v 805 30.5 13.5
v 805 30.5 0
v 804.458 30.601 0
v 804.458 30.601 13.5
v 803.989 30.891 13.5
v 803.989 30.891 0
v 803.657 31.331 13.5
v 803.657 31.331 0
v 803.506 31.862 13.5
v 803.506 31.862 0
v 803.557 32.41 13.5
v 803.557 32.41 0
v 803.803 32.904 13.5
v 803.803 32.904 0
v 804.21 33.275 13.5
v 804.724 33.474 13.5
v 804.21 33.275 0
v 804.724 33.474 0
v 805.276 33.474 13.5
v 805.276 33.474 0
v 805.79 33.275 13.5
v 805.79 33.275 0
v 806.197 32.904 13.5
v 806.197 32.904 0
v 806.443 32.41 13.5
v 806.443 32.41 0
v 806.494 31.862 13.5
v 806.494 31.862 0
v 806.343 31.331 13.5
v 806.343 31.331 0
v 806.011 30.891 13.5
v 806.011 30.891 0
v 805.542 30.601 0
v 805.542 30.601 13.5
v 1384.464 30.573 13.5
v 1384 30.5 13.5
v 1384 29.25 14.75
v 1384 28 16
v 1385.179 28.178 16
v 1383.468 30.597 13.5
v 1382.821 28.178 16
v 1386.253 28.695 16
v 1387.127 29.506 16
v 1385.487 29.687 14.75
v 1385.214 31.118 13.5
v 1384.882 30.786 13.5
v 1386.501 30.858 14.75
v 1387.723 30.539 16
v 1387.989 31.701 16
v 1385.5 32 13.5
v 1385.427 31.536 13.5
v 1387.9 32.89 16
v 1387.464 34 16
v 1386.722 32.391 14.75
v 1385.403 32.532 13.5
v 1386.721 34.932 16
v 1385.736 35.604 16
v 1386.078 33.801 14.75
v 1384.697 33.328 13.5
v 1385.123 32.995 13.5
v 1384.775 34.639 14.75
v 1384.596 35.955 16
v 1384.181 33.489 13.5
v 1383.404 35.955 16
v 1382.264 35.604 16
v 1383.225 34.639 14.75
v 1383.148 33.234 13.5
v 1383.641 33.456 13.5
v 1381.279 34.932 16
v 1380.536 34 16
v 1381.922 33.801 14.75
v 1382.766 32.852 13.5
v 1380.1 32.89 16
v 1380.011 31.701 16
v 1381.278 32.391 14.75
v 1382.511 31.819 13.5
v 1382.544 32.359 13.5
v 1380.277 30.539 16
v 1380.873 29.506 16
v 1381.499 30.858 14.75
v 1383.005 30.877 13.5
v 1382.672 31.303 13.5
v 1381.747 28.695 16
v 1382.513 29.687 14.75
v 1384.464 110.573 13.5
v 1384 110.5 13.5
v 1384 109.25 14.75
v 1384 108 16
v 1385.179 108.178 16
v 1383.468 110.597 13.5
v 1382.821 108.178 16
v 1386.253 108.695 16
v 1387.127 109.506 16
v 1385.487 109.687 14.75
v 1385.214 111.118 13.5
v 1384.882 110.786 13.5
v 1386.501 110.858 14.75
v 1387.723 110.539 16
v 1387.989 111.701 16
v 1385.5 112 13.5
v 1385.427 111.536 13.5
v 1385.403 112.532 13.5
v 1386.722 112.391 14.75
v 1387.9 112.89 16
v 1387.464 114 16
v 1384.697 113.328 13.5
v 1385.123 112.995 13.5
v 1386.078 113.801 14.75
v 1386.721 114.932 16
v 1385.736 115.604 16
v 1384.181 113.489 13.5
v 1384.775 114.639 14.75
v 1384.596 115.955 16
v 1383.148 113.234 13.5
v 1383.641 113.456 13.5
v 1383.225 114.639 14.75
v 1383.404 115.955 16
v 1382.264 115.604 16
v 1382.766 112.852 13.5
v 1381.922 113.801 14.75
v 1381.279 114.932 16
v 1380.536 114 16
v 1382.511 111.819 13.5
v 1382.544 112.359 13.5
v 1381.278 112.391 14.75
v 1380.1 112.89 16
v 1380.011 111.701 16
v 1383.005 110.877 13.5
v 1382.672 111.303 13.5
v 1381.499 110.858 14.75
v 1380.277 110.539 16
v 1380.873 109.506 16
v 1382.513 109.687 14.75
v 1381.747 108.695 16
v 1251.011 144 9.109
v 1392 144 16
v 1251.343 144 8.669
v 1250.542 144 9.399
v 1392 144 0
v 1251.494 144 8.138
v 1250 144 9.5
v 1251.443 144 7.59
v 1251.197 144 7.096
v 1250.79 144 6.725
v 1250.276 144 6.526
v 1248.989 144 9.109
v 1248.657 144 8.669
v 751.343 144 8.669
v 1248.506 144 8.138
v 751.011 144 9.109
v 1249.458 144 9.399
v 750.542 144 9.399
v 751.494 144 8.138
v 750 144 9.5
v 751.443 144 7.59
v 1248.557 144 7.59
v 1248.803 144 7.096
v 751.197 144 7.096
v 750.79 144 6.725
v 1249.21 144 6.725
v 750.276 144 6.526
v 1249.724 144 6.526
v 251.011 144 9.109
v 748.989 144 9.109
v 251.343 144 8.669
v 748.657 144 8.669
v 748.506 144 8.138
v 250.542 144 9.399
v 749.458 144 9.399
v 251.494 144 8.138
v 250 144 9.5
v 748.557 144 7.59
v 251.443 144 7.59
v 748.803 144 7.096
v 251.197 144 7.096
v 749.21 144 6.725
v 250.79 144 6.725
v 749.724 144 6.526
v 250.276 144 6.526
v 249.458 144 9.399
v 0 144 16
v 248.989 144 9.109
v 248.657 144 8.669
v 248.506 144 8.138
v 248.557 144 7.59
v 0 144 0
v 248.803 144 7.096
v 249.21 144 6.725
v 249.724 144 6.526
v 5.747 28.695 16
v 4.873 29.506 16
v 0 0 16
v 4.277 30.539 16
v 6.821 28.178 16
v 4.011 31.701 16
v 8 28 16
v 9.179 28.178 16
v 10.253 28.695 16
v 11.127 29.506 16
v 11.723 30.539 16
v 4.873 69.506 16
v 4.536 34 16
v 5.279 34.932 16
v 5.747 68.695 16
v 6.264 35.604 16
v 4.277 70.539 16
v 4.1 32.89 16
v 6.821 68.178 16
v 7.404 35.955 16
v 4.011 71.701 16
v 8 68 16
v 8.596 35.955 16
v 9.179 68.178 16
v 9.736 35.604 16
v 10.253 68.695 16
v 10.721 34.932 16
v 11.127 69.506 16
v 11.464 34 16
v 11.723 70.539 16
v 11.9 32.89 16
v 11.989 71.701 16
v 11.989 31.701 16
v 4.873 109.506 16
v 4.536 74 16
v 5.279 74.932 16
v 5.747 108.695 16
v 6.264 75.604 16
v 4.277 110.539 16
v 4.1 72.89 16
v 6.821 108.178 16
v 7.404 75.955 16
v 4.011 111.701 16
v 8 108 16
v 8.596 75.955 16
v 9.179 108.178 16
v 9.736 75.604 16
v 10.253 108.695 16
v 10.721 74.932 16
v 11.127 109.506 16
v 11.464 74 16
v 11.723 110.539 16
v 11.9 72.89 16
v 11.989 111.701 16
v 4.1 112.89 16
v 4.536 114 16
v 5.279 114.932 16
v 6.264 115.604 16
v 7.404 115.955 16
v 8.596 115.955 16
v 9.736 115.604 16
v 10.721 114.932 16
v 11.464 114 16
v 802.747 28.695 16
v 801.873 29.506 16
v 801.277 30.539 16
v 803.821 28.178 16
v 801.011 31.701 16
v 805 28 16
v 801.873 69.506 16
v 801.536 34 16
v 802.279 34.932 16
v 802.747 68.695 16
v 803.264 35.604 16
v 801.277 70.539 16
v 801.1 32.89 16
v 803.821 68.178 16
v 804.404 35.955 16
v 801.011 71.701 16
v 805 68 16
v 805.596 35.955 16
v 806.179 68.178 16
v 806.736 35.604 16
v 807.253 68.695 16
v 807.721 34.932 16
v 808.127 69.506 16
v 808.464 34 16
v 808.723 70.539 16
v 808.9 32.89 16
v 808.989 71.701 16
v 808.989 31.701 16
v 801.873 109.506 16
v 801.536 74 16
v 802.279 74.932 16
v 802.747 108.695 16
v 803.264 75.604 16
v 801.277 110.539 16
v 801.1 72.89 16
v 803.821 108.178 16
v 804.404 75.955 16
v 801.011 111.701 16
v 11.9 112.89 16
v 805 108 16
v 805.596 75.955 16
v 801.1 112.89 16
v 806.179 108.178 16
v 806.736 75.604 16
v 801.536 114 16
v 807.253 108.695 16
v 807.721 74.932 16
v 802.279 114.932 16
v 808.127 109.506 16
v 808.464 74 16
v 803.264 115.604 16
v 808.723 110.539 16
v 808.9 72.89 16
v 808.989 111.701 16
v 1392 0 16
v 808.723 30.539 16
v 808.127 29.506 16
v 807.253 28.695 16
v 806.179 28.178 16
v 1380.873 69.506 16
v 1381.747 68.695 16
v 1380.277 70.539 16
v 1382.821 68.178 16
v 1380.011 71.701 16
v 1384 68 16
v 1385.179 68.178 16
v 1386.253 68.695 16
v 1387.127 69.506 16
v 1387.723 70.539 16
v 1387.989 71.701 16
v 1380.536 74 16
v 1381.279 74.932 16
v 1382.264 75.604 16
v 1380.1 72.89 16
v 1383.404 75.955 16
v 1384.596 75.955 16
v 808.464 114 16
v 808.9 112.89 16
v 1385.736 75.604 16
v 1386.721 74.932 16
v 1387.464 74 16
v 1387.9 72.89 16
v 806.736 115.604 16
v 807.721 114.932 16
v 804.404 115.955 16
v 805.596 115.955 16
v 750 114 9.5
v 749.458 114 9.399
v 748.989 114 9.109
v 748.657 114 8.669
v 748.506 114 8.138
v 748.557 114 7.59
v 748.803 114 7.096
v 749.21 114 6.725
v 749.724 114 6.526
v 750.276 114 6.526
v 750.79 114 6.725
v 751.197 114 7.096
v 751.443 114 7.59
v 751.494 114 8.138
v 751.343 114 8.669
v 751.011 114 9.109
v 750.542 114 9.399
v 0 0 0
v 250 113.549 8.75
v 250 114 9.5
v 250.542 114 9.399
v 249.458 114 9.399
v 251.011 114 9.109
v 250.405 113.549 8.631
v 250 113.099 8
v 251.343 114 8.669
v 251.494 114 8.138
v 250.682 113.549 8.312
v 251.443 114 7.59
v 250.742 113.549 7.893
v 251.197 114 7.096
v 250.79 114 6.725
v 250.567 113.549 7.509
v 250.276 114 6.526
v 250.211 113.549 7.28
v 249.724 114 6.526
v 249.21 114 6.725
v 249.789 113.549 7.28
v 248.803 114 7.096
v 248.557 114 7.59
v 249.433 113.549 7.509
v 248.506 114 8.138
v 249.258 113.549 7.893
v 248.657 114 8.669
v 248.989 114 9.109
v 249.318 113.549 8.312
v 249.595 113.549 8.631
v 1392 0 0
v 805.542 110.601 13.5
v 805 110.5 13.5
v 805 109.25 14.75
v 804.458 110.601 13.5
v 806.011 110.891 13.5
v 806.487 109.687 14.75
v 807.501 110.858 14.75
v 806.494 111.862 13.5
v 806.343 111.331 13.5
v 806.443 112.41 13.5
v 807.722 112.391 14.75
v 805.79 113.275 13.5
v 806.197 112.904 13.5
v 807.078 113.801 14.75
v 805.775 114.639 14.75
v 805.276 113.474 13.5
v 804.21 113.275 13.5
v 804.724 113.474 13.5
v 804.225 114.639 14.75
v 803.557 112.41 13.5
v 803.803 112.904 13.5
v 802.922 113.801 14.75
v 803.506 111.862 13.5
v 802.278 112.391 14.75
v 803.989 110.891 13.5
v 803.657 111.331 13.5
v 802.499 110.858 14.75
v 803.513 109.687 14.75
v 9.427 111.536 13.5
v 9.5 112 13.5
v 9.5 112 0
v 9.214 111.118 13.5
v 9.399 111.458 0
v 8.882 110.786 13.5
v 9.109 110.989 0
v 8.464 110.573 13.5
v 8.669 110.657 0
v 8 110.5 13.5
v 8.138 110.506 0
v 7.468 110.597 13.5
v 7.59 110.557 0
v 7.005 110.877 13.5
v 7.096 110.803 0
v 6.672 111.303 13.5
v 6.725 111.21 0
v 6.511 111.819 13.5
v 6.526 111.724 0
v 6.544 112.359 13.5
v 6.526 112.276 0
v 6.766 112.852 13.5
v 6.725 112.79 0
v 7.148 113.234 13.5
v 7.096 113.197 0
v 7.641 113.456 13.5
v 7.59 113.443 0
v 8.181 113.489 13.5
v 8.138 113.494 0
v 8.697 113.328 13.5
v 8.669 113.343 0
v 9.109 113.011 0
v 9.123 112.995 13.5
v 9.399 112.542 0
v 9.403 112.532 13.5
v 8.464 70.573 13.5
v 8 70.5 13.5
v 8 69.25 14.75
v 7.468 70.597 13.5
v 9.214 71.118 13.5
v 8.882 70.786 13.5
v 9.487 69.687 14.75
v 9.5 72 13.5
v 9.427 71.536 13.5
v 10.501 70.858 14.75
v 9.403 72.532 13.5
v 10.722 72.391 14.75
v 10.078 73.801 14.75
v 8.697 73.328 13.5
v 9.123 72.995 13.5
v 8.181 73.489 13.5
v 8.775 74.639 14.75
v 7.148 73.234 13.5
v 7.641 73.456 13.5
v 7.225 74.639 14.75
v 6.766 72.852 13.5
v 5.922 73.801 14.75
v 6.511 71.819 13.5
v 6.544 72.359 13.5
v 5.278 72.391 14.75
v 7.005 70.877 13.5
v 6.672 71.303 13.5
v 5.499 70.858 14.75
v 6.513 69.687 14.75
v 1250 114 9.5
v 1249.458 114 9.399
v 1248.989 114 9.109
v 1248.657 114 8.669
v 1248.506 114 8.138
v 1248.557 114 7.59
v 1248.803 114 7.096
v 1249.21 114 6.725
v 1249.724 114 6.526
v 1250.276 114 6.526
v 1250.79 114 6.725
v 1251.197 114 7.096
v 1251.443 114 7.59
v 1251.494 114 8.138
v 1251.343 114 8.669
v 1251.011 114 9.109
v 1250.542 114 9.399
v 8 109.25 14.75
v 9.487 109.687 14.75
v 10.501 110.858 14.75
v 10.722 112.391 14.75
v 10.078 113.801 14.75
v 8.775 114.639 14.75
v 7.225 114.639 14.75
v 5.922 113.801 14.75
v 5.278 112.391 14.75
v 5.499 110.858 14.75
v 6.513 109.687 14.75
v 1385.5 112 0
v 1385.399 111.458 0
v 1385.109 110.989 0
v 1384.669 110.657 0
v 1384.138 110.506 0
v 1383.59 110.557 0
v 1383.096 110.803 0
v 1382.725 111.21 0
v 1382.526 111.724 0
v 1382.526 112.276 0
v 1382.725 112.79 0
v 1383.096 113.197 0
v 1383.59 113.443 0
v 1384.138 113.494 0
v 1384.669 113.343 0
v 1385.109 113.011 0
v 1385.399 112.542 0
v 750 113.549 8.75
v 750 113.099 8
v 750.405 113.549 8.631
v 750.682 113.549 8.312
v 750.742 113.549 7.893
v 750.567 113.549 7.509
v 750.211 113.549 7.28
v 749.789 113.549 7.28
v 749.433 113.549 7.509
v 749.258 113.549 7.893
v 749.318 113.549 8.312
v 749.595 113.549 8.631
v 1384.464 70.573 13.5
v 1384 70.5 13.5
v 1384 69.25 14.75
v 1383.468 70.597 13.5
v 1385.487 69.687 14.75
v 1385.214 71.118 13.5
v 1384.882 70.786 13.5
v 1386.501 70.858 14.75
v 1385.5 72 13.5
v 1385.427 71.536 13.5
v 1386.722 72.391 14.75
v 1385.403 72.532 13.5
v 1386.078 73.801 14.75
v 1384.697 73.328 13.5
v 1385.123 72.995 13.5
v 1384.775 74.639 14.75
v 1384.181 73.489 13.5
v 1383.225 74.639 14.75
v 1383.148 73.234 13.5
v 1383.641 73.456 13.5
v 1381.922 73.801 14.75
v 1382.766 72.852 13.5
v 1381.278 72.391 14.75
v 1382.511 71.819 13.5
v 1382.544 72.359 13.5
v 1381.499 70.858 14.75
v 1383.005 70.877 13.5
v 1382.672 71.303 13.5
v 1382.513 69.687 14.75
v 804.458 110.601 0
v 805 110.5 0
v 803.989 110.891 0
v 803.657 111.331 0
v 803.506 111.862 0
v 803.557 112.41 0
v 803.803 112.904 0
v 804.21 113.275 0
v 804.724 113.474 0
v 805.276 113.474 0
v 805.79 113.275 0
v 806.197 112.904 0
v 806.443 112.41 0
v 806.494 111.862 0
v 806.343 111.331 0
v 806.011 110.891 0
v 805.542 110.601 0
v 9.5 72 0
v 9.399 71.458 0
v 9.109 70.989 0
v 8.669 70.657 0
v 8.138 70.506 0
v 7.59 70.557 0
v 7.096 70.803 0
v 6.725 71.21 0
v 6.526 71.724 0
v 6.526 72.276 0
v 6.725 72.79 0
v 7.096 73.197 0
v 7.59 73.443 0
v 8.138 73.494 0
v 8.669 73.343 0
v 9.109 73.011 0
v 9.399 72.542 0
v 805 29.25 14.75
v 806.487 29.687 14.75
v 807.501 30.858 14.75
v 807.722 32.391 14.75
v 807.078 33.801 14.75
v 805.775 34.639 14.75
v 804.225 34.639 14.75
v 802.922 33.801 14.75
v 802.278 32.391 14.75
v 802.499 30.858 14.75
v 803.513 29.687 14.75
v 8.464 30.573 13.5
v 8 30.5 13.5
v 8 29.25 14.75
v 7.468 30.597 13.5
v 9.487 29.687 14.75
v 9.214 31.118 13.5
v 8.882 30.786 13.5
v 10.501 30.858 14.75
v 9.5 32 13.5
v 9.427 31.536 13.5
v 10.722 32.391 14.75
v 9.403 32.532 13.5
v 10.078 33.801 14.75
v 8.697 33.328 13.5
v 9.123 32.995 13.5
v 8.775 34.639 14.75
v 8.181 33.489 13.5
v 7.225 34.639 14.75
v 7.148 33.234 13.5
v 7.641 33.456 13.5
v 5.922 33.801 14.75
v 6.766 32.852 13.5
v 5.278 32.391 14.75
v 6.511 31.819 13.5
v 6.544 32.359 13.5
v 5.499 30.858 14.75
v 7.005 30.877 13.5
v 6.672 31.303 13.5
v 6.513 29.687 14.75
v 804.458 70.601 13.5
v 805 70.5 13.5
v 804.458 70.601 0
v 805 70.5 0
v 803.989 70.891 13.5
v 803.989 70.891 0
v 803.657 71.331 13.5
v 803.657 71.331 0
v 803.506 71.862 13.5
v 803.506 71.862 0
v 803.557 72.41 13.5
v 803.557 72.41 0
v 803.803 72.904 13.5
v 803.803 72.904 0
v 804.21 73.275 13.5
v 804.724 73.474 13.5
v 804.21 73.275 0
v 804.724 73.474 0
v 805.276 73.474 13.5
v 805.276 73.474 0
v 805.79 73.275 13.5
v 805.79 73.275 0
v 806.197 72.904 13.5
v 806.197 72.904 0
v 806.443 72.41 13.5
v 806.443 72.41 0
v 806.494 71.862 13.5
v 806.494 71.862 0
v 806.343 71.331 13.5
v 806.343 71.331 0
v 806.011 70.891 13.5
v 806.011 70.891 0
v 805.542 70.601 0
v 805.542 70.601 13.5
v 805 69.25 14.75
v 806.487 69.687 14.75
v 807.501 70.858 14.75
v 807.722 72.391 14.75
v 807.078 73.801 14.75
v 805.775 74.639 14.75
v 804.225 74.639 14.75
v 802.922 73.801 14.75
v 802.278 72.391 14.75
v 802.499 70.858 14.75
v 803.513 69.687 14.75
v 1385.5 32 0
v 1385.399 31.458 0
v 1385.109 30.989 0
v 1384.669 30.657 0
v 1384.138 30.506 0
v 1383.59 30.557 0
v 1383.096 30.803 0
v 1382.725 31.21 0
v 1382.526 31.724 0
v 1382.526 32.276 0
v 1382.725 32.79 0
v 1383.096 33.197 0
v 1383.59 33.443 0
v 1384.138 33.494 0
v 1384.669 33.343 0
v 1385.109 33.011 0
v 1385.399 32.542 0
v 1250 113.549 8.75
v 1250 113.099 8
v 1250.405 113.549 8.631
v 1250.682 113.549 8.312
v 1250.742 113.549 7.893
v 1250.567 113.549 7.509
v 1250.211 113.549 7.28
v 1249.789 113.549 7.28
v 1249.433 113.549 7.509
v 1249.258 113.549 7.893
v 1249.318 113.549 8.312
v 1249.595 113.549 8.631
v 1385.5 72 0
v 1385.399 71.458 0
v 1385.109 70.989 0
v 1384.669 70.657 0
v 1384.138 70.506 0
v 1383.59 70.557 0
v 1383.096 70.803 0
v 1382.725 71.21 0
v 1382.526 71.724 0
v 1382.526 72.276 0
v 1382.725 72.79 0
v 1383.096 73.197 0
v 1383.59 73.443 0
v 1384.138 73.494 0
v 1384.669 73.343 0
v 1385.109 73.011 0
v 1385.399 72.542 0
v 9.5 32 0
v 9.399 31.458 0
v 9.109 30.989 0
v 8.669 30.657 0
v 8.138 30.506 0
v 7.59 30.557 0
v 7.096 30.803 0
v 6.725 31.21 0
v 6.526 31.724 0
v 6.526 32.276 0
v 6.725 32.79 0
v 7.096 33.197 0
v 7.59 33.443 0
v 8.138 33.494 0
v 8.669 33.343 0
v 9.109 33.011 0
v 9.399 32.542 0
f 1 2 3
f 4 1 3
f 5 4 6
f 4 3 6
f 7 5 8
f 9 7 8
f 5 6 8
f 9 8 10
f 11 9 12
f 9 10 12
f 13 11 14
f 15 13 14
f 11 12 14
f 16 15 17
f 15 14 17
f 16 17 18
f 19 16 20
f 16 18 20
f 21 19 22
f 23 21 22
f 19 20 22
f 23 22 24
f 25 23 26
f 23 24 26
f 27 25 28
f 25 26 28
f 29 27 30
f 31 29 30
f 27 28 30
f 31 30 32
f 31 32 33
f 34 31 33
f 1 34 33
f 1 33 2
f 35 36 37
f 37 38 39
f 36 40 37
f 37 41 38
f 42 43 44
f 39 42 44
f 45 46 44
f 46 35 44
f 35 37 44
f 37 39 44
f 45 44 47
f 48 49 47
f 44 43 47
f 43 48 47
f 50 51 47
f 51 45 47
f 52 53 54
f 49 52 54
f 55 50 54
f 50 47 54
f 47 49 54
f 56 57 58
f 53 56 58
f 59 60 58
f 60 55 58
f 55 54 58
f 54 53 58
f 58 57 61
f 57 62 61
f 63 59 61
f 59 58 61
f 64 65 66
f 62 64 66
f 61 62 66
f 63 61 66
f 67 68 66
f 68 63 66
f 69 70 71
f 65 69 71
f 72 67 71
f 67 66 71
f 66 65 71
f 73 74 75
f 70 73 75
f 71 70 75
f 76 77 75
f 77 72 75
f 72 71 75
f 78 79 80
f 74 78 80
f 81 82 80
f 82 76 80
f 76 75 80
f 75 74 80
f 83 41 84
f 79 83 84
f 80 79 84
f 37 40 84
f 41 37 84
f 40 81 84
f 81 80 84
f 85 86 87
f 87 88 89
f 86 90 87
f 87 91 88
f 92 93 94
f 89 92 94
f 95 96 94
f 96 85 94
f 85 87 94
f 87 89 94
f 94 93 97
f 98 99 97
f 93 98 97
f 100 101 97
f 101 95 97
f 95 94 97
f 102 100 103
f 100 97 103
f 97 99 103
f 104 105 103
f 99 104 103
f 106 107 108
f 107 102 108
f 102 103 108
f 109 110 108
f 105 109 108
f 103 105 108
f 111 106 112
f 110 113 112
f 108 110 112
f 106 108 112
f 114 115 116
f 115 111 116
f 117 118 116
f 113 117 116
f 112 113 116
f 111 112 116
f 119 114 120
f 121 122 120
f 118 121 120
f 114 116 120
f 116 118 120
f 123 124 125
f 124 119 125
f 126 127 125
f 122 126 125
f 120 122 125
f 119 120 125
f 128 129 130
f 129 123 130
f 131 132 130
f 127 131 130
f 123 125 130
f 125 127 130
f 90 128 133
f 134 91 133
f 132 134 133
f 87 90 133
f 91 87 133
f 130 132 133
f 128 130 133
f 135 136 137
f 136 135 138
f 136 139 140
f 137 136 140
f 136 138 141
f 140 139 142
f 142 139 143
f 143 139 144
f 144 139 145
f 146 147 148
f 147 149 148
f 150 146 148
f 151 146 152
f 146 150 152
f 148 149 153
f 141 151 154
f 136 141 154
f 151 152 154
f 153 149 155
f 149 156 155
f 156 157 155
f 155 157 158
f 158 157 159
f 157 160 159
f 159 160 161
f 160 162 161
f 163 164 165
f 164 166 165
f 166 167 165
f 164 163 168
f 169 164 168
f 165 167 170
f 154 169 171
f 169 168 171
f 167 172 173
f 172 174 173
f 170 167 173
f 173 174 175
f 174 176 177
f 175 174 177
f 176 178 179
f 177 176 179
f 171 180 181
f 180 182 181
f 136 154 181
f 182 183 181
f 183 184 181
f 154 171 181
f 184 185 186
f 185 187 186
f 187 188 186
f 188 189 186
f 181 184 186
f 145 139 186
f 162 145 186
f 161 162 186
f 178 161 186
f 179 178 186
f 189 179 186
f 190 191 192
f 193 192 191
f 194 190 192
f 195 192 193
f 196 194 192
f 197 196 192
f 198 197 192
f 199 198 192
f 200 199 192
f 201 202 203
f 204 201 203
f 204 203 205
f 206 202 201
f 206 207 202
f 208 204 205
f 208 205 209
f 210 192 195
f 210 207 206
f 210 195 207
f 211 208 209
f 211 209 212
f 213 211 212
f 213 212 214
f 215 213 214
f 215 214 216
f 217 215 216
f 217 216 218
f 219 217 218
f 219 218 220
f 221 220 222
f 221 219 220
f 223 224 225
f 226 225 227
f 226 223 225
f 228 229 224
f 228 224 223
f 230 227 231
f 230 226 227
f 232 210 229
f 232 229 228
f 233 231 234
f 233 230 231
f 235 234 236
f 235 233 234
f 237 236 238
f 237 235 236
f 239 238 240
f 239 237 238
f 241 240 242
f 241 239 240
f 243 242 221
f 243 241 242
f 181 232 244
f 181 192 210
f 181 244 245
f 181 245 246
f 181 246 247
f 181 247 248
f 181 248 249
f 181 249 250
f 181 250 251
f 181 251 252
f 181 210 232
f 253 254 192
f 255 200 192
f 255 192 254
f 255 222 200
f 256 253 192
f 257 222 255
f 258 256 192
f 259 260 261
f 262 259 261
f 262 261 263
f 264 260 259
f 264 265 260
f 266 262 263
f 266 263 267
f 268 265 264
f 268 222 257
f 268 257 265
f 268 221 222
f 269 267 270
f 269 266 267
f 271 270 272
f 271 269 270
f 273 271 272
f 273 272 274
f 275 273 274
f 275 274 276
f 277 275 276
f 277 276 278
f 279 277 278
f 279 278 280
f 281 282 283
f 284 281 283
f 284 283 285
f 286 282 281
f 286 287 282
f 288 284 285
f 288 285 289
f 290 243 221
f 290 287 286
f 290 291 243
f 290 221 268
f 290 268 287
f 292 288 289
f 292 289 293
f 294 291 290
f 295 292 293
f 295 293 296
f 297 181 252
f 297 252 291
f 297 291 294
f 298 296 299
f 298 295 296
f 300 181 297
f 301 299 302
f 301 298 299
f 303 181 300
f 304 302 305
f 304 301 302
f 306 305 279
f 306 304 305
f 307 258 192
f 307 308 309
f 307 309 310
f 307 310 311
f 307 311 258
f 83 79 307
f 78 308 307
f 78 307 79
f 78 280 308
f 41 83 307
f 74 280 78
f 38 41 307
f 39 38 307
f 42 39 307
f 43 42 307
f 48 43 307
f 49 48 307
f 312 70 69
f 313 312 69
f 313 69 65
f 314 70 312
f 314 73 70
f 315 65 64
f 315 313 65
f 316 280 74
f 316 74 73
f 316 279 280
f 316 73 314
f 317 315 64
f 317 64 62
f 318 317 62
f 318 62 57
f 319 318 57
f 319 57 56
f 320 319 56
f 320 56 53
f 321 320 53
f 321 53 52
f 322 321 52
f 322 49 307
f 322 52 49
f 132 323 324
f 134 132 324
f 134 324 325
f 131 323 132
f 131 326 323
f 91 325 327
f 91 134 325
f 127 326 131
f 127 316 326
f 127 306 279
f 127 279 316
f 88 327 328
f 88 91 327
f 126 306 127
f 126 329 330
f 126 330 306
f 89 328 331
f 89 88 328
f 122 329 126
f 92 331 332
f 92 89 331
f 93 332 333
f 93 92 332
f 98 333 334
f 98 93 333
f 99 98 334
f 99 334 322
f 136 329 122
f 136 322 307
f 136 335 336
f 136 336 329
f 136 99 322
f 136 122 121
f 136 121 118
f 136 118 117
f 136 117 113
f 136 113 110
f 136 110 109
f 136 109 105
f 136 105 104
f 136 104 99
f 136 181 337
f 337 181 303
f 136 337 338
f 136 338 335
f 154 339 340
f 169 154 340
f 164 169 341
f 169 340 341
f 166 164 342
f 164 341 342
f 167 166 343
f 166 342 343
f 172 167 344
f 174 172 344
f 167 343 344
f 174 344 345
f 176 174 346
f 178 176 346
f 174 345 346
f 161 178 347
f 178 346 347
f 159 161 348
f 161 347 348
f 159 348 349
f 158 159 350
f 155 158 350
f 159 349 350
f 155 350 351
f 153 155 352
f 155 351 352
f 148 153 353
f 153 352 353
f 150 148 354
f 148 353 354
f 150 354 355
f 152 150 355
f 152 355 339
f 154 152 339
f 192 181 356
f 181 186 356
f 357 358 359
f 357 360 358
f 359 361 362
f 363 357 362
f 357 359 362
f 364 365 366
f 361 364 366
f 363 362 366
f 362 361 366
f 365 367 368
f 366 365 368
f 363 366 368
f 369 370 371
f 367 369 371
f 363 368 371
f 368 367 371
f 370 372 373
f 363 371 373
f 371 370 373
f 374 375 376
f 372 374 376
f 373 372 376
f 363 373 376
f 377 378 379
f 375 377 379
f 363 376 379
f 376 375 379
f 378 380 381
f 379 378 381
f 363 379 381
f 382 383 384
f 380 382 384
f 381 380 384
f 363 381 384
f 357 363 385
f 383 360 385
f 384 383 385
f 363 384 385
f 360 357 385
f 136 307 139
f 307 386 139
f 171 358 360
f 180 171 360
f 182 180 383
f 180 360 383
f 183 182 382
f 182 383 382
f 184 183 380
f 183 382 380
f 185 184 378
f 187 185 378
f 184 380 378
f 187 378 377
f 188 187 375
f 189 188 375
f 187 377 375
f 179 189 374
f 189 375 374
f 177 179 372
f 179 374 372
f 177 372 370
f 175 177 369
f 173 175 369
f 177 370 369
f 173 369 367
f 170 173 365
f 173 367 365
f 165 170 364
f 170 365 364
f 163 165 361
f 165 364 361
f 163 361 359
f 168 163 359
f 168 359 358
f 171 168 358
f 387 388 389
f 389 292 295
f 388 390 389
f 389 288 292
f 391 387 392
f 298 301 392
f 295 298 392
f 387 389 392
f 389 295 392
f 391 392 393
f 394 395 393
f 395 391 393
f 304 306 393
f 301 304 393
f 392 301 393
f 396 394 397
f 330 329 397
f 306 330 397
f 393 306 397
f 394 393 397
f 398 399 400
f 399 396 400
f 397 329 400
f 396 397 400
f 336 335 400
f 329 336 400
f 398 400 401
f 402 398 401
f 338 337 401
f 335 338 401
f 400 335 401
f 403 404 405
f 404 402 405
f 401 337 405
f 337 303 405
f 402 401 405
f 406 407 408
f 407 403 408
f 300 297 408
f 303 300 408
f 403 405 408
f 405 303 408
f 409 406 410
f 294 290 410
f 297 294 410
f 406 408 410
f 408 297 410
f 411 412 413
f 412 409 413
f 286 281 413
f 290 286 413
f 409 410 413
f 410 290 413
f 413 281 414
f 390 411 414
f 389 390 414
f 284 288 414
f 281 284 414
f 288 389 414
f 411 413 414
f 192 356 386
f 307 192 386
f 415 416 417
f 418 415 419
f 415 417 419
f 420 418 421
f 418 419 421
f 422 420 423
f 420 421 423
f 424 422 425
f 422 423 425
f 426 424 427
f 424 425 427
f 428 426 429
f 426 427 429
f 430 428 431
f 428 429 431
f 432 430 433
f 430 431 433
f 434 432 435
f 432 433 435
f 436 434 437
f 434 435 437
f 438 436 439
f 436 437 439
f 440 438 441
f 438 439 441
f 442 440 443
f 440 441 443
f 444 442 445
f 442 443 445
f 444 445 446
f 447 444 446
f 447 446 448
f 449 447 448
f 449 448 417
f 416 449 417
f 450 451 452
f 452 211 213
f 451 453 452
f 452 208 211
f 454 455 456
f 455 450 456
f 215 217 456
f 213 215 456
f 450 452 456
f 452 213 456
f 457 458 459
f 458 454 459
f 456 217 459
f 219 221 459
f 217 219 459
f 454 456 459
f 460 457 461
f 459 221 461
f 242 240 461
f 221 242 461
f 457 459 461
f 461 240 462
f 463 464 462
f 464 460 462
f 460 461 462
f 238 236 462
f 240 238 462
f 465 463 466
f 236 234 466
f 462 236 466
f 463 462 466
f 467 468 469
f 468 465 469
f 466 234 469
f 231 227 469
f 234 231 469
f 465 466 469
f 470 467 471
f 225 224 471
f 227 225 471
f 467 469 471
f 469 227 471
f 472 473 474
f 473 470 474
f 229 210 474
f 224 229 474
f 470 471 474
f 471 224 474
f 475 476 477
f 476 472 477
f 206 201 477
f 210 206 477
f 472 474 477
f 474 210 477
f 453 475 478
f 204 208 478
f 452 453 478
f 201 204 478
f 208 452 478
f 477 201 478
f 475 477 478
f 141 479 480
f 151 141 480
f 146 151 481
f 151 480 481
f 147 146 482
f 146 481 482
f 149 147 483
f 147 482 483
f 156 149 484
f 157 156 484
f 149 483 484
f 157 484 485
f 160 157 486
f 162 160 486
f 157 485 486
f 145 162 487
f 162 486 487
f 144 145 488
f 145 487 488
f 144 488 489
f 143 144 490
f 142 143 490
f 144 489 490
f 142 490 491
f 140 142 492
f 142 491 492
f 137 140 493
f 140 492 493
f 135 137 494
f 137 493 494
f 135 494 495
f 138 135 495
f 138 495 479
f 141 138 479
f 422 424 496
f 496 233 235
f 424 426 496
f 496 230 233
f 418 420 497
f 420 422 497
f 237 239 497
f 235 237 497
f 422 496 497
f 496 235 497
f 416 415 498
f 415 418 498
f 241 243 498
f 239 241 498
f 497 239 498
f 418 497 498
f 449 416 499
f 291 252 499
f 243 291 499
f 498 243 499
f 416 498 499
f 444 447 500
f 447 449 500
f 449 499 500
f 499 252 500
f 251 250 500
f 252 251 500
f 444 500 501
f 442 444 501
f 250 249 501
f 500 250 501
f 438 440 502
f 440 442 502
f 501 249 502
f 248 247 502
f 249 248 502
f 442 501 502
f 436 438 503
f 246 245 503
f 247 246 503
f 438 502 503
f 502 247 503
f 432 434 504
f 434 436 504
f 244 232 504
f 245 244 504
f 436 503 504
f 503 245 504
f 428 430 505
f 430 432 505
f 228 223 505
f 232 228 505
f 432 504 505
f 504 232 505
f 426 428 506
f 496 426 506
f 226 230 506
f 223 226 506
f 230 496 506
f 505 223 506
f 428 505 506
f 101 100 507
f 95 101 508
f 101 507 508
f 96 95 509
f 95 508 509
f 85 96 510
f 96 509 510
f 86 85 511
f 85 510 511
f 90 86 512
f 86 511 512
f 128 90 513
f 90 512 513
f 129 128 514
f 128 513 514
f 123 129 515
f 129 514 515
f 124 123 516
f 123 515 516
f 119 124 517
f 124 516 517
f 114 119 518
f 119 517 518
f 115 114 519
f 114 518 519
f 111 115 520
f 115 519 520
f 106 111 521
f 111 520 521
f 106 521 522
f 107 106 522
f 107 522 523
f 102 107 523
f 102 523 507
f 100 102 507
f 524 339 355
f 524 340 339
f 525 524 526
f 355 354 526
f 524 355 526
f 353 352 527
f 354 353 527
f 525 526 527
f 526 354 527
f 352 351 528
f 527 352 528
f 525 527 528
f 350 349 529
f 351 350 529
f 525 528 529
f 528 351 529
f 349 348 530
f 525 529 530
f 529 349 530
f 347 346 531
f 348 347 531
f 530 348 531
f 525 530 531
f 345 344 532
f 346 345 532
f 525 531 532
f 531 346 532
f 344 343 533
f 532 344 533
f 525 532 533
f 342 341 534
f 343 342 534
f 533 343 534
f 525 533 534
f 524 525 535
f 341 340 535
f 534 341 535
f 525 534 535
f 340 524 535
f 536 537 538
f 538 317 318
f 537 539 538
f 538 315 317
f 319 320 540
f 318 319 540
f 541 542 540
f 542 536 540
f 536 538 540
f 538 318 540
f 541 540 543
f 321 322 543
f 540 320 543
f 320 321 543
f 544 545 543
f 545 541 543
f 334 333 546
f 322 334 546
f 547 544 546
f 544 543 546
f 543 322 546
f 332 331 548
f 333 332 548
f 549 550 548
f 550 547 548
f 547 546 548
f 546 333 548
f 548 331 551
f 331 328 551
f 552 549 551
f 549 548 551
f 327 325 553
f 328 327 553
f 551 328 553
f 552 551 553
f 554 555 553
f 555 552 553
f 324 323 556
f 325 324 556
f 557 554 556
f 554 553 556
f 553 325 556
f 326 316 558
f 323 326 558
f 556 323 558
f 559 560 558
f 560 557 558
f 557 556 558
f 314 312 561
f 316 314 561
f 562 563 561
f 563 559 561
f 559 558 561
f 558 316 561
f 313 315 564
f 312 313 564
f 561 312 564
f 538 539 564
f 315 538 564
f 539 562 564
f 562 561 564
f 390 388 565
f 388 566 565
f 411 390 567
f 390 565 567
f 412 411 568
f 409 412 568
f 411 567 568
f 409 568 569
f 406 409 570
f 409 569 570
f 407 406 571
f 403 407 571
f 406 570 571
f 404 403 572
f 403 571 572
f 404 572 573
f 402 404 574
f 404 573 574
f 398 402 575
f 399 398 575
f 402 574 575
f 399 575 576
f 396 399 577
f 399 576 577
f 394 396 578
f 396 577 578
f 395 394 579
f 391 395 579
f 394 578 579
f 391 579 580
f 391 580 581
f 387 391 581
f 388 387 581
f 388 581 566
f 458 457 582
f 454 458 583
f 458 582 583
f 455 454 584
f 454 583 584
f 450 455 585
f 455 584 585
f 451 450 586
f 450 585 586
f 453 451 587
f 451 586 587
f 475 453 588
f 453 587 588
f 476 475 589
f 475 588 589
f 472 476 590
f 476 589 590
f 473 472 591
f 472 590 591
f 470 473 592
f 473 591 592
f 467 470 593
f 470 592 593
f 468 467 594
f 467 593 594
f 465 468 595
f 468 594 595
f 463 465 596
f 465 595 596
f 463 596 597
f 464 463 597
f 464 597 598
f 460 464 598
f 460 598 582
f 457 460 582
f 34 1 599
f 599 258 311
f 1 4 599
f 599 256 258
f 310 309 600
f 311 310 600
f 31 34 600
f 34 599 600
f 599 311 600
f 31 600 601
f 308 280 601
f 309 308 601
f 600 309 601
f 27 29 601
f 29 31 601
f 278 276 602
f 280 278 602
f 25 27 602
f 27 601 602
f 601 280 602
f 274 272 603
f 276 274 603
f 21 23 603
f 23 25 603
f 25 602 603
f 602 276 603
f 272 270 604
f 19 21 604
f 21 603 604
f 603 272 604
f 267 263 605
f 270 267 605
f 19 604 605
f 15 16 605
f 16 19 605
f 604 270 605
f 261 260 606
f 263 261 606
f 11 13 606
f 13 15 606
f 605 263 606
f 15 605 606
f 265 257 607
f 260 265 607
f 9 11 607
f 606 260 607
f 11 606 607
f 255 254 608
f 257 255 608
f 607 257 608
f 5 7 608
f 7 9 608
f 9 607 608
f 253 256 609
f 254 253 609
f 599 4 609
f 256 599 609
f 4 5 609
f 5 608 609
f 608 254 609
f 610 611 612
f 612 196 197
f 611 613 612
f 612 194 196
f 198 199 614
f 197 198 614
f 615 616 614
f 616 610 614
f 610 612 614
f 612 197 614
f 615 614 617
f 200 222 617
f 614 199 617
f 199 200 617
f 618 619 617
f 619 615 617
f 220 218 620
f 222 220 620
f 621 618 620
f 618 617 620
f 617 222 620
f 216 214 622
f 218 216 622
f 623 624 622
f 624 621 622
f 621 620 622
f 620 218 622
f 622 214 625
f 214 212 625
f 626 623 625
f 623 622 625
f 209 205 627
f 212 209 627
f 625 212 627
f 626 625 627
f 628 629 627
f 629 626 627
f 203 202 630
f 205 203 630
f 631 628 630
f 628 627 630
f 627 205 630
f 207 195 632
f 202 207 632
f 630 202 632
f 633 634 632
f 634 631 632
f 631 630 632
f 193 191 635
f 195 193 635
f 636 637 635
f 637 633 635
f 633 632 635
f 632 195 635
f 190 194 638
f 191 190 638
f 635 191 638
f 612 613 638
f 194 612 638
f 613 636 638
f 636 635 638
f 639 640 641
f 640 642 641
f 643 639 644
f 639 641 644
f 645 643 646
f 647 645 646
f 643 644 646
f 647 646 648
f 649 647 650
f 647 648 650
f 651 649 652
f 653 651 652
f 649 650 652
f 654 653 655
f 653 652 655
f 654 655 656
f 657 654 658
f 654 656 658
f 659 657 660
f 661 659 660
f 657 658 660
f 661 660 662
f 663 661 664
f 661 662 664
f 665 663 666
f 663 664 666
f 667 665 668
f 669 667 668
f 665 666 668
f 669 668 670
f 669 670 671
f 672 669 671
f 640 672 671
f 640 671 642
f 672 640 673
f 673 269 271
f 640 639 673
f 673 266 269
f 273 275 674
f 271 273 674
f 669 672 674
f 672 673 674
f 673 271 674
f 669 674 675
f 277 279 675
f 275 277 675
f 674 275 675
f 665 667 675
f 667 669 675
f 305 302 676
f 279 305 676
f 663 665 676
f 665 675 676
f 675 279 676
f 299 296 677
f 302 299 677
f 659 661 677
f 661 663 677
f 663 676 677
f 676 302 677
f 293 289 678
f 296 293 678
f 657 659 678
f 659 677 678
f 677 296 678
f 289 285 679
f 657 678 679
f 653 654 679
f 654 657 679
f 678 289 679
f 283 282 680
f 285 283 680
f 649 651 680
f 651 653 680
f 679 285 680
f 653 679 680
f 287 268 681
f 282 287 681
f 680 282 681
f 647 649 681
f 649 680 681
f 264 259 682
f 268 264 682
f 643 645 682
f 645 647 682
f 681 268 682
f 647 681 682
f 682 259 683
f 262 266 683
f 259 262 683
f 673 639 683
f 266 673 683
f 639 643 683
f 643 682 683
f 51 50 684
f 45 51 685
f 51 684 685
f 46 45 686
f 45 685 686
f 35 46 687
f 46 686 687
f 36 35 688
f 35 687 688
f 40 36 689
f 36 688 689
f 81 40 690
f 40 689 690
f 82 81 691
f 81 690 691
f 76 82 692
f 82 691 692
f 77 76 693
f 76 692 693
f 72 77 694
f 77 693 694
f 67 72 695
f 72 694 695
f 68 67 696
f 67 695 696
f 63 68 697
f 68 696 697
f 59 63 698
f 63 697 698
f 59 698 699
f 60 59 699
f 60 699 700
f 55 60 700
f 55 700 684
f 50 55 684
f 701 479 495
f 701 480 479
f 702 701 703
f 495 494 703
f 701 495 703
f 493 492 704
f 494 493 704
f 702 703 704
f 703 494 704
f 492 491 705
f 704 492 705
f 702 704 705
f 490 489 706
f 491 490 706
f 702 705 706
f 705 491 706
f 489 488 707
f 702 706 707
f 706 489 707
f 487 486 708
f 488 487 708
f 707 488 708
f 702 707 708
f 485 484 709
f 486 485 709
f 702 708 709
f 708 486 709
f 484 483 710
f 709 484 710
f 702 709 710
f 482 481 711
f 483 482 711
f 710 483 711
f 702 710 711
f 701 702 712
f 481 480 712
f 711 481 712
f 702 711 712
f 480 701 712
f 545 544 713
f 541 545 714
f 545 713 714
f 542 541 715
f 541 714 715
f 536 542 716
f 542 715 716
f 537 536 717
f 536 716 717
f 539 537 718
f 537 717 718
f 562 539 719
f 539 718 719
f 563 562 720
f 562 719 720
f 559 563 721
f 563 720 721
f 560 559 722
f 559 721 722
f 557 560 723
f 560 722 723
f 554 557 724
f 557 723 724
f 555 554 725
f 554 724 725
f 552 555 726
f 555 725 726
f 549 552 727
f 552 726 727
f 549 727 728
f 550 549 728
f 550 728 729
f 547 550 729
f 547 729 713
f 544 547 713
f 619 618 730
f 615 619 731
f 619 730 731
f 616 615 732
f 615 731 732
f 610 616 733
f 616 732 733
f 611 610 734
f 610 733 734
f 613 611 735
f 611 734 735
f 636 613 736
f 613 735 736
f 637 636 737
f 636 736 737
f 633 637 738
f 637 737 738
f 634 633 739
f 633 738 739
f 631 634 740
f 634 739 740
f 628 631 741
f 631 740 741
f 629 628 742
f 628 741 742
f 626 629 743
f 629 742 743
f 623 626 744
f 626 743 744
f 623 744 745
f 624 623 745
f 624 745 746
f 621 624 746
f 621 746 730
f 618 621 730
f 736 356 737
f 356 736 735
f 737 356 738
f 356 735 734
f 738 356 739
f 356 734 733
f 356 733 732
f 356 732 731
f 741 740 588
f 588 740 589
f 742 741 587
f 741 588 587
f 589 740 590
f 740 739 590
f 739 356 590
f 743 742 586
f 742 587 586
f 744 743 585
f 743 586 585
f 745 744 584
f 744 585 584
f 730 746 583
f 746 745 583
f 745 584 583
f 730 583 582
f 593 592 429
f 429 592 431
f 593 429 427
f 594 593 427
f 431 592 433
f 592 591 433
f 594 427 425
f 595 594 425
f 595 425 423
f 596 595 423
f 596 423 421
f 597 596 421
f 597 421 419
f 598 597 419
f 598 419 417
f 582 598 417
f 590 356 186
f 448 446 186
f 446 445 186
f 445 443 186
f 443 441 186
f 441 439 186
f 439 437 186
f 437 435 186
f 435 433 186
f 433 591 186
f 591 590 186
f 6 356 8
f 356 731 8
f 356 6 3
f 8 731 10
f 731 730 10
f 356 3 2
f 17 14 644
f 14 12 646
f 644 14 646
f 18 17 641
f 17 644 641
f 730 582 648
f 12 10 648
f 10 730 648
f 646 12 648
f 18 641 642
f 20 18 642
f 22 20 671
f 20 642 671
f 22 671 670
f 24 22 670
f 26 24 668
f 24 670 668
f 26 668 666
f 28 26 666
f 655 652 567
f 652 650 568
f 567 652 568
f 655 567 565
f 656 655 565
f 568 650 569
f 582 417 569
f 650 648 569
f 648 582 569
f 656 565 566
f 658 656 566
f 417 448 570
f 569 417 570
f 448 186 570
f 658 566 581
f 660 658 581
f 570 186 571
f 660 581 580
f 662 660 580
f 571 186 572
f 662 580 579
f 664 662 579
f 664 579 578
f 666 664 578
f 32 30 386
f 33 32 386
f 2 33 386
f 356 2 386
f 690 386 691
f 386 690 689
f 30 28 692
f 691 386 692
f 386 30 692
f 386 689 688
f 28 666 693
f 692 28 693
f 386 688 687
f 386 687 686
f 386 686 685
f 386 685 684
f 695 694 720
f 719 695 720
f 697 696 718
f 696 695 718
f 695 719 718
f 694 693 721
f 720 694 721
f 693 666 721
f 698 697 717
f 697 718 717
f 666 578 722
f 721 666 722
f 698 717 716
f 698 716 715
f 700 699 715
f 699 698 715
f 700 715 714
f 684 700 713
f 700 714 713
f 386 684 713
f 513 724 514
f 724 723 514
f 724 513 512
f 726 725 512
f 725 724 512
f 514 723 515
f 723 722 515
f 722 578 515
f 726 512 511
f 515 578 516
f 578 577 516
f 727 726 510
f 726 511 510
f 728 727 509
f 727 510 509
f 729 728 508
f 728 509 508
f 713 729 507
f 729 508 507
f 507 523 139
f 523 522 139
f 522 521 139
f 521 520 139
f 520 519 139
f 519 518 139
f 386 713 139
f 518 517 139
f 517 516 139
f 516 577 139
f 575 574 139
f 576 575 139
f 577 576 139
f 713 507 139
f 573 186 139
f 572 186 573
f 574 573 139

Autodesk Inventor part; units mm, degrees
ref_plane "YZ Plane" through (0, 0, 0) normal (1, 0, 0) x (0, 1, 0)
ref_plane "XZ Plane" through (0, 0, 0) normal (0, 1, 0) x (-1, 0, 0)
ref_plane "XY Plane" through (0, 0, 0) normal (0, 0, 1) x (1, 0, 0)
sketch "Skizze1" plane through (0, 0, 0) normal (0, 0, 1) x (1, 0, 0)
  line L0 (0, 0) -> (1392, 0)
  line L1 (1392, 0) -> (1392, 144)
  line L2 (1392, 144) -> (0, 144)
  line L3 (0, 144) -> (0, 0)
  line L4 (1384, 144) -> (1384, 0) construction
  line L5 (1392, 112) -> (0, 112) construction
  line L6 (1392, 32) -> (0, 32) construction
  circle A0 centre (1384, 112) radius 1.5
  circle A1 centre (1384, 32) radius 1.5
  line L7 (8, 144) -> (8, 0) construction
  circle A2 centre (8, 112) radius 1.5
  circle A3 centre (8, 72) radius 1.5
  circle A4 centre (8, 32) radius 1.5
  circle A5 centre (1384, 72) radius 1.5
  circle A6 centre (805, 112) radius 1.5
  circle A7 centre (805, 72) radius 1.5
  circle A8 centre (805, 32) radius 1.5
  line L8 (805, 144) -> (805, 0) construction
  point P0 (1392, 72)
  point P1 (805, 72)
  dimension "d0" = 1392
  dimension "d1" = 144
  dimension "d20" = 8
  dimension "d21" = 40
  dimension "d22" = 40
  dimension "d23" = 3
  dimension "d24" = 3
  dimension "d25" = 8
  dimension "d26" = 3
  dimension "d27" = 3
  dimension "d28" = 3
  dimension "d29" = 3
  dimension "d131" = 3
  dimension "d132" = 3
  dimension "d133" = 3
  dimension "d134" = 805
extrude "Extrusion1" add sketch "Skizze1" along normal blind 16 contours L3 L2 L1 L0 | A6 | A7 | A8
sketch "Skizze2" plane through (0, 0, 16) normal (0, 0, 1) x (1, 0, 0)
  circle A0 centre (1384, 112) radius 1.5 projected
  circle A1 centre (1384, 72) radius 1.5 projected
  circle A2 centre (1384, 32) radius 1.5 projected
  circle A3 centre (8, 72) radius 1.5 projected
  circle A4 centre (8, 112) radius 1.5 projected
  circle A5 centre (8, 32) radius 1.5 projected
  circle A6 centre (805, 32) radius 1.5 projected
  circle A7 centre (805, 112) radius 1.5 projected
  circle A8 centre (805, 72) radius 1.5 projected
  point P0 (0, 0)
  point P1 (805, 72)
  point P2 (821.0338, 32)
  point P3 (821.0338, 72)
hole "Bohrung7" at (1384, 112, 16) at (1384, 72, 16) at (1384, 32, 16) at (8, 72, 16) at (8, 32, 16) at (8, 112, 16) at (805, 32, 16) at (805, 112, 16) at (805, 72, 16) at (805, 112, 16) at (805, 32, 16) at (805, 72, 16) at (805, 112, 16) direction (0, 0, -1) diameter 3 end through all countersink diameter 8 countersink angle 90
sketch "Skizze3" plane through (0, 144, 0) normal (0, 1, 0) x (1, 0, 0)
  line L0 (0, 0) -> (1392, 0) construction
  line L1 (1392, 0) -> (1392, -16) construction
  line L2 (1392, -16) -> (0, -16) construction
  line L3 (0, -16) -> (0, 0) construction
  line L4 (0, 0) -> (0, -16) projected
  line L5 (0, -8) -> (1392, -8) construction
  line L6 (1392, 0) -> (1392, -16) projected
  line L7 (0, -16) -> (1392, -16) construction
  line L8 (696, -16) -> (696, 0) construction
  point P0 (250, -8)
  point P1 (750, -8)
  point P2 (1250, -8)
  dimension "d135" = 500
  dimension "d136" = 500
  dimension "d137" = 250
hole "Bohrung12" at (250, 144, 8) at (750, 144, 8) at (1250, 144, 8) direction (0, -1, 0) diameter 3 depth 30 tip angle 118
properties part number "licht_200_back1"
